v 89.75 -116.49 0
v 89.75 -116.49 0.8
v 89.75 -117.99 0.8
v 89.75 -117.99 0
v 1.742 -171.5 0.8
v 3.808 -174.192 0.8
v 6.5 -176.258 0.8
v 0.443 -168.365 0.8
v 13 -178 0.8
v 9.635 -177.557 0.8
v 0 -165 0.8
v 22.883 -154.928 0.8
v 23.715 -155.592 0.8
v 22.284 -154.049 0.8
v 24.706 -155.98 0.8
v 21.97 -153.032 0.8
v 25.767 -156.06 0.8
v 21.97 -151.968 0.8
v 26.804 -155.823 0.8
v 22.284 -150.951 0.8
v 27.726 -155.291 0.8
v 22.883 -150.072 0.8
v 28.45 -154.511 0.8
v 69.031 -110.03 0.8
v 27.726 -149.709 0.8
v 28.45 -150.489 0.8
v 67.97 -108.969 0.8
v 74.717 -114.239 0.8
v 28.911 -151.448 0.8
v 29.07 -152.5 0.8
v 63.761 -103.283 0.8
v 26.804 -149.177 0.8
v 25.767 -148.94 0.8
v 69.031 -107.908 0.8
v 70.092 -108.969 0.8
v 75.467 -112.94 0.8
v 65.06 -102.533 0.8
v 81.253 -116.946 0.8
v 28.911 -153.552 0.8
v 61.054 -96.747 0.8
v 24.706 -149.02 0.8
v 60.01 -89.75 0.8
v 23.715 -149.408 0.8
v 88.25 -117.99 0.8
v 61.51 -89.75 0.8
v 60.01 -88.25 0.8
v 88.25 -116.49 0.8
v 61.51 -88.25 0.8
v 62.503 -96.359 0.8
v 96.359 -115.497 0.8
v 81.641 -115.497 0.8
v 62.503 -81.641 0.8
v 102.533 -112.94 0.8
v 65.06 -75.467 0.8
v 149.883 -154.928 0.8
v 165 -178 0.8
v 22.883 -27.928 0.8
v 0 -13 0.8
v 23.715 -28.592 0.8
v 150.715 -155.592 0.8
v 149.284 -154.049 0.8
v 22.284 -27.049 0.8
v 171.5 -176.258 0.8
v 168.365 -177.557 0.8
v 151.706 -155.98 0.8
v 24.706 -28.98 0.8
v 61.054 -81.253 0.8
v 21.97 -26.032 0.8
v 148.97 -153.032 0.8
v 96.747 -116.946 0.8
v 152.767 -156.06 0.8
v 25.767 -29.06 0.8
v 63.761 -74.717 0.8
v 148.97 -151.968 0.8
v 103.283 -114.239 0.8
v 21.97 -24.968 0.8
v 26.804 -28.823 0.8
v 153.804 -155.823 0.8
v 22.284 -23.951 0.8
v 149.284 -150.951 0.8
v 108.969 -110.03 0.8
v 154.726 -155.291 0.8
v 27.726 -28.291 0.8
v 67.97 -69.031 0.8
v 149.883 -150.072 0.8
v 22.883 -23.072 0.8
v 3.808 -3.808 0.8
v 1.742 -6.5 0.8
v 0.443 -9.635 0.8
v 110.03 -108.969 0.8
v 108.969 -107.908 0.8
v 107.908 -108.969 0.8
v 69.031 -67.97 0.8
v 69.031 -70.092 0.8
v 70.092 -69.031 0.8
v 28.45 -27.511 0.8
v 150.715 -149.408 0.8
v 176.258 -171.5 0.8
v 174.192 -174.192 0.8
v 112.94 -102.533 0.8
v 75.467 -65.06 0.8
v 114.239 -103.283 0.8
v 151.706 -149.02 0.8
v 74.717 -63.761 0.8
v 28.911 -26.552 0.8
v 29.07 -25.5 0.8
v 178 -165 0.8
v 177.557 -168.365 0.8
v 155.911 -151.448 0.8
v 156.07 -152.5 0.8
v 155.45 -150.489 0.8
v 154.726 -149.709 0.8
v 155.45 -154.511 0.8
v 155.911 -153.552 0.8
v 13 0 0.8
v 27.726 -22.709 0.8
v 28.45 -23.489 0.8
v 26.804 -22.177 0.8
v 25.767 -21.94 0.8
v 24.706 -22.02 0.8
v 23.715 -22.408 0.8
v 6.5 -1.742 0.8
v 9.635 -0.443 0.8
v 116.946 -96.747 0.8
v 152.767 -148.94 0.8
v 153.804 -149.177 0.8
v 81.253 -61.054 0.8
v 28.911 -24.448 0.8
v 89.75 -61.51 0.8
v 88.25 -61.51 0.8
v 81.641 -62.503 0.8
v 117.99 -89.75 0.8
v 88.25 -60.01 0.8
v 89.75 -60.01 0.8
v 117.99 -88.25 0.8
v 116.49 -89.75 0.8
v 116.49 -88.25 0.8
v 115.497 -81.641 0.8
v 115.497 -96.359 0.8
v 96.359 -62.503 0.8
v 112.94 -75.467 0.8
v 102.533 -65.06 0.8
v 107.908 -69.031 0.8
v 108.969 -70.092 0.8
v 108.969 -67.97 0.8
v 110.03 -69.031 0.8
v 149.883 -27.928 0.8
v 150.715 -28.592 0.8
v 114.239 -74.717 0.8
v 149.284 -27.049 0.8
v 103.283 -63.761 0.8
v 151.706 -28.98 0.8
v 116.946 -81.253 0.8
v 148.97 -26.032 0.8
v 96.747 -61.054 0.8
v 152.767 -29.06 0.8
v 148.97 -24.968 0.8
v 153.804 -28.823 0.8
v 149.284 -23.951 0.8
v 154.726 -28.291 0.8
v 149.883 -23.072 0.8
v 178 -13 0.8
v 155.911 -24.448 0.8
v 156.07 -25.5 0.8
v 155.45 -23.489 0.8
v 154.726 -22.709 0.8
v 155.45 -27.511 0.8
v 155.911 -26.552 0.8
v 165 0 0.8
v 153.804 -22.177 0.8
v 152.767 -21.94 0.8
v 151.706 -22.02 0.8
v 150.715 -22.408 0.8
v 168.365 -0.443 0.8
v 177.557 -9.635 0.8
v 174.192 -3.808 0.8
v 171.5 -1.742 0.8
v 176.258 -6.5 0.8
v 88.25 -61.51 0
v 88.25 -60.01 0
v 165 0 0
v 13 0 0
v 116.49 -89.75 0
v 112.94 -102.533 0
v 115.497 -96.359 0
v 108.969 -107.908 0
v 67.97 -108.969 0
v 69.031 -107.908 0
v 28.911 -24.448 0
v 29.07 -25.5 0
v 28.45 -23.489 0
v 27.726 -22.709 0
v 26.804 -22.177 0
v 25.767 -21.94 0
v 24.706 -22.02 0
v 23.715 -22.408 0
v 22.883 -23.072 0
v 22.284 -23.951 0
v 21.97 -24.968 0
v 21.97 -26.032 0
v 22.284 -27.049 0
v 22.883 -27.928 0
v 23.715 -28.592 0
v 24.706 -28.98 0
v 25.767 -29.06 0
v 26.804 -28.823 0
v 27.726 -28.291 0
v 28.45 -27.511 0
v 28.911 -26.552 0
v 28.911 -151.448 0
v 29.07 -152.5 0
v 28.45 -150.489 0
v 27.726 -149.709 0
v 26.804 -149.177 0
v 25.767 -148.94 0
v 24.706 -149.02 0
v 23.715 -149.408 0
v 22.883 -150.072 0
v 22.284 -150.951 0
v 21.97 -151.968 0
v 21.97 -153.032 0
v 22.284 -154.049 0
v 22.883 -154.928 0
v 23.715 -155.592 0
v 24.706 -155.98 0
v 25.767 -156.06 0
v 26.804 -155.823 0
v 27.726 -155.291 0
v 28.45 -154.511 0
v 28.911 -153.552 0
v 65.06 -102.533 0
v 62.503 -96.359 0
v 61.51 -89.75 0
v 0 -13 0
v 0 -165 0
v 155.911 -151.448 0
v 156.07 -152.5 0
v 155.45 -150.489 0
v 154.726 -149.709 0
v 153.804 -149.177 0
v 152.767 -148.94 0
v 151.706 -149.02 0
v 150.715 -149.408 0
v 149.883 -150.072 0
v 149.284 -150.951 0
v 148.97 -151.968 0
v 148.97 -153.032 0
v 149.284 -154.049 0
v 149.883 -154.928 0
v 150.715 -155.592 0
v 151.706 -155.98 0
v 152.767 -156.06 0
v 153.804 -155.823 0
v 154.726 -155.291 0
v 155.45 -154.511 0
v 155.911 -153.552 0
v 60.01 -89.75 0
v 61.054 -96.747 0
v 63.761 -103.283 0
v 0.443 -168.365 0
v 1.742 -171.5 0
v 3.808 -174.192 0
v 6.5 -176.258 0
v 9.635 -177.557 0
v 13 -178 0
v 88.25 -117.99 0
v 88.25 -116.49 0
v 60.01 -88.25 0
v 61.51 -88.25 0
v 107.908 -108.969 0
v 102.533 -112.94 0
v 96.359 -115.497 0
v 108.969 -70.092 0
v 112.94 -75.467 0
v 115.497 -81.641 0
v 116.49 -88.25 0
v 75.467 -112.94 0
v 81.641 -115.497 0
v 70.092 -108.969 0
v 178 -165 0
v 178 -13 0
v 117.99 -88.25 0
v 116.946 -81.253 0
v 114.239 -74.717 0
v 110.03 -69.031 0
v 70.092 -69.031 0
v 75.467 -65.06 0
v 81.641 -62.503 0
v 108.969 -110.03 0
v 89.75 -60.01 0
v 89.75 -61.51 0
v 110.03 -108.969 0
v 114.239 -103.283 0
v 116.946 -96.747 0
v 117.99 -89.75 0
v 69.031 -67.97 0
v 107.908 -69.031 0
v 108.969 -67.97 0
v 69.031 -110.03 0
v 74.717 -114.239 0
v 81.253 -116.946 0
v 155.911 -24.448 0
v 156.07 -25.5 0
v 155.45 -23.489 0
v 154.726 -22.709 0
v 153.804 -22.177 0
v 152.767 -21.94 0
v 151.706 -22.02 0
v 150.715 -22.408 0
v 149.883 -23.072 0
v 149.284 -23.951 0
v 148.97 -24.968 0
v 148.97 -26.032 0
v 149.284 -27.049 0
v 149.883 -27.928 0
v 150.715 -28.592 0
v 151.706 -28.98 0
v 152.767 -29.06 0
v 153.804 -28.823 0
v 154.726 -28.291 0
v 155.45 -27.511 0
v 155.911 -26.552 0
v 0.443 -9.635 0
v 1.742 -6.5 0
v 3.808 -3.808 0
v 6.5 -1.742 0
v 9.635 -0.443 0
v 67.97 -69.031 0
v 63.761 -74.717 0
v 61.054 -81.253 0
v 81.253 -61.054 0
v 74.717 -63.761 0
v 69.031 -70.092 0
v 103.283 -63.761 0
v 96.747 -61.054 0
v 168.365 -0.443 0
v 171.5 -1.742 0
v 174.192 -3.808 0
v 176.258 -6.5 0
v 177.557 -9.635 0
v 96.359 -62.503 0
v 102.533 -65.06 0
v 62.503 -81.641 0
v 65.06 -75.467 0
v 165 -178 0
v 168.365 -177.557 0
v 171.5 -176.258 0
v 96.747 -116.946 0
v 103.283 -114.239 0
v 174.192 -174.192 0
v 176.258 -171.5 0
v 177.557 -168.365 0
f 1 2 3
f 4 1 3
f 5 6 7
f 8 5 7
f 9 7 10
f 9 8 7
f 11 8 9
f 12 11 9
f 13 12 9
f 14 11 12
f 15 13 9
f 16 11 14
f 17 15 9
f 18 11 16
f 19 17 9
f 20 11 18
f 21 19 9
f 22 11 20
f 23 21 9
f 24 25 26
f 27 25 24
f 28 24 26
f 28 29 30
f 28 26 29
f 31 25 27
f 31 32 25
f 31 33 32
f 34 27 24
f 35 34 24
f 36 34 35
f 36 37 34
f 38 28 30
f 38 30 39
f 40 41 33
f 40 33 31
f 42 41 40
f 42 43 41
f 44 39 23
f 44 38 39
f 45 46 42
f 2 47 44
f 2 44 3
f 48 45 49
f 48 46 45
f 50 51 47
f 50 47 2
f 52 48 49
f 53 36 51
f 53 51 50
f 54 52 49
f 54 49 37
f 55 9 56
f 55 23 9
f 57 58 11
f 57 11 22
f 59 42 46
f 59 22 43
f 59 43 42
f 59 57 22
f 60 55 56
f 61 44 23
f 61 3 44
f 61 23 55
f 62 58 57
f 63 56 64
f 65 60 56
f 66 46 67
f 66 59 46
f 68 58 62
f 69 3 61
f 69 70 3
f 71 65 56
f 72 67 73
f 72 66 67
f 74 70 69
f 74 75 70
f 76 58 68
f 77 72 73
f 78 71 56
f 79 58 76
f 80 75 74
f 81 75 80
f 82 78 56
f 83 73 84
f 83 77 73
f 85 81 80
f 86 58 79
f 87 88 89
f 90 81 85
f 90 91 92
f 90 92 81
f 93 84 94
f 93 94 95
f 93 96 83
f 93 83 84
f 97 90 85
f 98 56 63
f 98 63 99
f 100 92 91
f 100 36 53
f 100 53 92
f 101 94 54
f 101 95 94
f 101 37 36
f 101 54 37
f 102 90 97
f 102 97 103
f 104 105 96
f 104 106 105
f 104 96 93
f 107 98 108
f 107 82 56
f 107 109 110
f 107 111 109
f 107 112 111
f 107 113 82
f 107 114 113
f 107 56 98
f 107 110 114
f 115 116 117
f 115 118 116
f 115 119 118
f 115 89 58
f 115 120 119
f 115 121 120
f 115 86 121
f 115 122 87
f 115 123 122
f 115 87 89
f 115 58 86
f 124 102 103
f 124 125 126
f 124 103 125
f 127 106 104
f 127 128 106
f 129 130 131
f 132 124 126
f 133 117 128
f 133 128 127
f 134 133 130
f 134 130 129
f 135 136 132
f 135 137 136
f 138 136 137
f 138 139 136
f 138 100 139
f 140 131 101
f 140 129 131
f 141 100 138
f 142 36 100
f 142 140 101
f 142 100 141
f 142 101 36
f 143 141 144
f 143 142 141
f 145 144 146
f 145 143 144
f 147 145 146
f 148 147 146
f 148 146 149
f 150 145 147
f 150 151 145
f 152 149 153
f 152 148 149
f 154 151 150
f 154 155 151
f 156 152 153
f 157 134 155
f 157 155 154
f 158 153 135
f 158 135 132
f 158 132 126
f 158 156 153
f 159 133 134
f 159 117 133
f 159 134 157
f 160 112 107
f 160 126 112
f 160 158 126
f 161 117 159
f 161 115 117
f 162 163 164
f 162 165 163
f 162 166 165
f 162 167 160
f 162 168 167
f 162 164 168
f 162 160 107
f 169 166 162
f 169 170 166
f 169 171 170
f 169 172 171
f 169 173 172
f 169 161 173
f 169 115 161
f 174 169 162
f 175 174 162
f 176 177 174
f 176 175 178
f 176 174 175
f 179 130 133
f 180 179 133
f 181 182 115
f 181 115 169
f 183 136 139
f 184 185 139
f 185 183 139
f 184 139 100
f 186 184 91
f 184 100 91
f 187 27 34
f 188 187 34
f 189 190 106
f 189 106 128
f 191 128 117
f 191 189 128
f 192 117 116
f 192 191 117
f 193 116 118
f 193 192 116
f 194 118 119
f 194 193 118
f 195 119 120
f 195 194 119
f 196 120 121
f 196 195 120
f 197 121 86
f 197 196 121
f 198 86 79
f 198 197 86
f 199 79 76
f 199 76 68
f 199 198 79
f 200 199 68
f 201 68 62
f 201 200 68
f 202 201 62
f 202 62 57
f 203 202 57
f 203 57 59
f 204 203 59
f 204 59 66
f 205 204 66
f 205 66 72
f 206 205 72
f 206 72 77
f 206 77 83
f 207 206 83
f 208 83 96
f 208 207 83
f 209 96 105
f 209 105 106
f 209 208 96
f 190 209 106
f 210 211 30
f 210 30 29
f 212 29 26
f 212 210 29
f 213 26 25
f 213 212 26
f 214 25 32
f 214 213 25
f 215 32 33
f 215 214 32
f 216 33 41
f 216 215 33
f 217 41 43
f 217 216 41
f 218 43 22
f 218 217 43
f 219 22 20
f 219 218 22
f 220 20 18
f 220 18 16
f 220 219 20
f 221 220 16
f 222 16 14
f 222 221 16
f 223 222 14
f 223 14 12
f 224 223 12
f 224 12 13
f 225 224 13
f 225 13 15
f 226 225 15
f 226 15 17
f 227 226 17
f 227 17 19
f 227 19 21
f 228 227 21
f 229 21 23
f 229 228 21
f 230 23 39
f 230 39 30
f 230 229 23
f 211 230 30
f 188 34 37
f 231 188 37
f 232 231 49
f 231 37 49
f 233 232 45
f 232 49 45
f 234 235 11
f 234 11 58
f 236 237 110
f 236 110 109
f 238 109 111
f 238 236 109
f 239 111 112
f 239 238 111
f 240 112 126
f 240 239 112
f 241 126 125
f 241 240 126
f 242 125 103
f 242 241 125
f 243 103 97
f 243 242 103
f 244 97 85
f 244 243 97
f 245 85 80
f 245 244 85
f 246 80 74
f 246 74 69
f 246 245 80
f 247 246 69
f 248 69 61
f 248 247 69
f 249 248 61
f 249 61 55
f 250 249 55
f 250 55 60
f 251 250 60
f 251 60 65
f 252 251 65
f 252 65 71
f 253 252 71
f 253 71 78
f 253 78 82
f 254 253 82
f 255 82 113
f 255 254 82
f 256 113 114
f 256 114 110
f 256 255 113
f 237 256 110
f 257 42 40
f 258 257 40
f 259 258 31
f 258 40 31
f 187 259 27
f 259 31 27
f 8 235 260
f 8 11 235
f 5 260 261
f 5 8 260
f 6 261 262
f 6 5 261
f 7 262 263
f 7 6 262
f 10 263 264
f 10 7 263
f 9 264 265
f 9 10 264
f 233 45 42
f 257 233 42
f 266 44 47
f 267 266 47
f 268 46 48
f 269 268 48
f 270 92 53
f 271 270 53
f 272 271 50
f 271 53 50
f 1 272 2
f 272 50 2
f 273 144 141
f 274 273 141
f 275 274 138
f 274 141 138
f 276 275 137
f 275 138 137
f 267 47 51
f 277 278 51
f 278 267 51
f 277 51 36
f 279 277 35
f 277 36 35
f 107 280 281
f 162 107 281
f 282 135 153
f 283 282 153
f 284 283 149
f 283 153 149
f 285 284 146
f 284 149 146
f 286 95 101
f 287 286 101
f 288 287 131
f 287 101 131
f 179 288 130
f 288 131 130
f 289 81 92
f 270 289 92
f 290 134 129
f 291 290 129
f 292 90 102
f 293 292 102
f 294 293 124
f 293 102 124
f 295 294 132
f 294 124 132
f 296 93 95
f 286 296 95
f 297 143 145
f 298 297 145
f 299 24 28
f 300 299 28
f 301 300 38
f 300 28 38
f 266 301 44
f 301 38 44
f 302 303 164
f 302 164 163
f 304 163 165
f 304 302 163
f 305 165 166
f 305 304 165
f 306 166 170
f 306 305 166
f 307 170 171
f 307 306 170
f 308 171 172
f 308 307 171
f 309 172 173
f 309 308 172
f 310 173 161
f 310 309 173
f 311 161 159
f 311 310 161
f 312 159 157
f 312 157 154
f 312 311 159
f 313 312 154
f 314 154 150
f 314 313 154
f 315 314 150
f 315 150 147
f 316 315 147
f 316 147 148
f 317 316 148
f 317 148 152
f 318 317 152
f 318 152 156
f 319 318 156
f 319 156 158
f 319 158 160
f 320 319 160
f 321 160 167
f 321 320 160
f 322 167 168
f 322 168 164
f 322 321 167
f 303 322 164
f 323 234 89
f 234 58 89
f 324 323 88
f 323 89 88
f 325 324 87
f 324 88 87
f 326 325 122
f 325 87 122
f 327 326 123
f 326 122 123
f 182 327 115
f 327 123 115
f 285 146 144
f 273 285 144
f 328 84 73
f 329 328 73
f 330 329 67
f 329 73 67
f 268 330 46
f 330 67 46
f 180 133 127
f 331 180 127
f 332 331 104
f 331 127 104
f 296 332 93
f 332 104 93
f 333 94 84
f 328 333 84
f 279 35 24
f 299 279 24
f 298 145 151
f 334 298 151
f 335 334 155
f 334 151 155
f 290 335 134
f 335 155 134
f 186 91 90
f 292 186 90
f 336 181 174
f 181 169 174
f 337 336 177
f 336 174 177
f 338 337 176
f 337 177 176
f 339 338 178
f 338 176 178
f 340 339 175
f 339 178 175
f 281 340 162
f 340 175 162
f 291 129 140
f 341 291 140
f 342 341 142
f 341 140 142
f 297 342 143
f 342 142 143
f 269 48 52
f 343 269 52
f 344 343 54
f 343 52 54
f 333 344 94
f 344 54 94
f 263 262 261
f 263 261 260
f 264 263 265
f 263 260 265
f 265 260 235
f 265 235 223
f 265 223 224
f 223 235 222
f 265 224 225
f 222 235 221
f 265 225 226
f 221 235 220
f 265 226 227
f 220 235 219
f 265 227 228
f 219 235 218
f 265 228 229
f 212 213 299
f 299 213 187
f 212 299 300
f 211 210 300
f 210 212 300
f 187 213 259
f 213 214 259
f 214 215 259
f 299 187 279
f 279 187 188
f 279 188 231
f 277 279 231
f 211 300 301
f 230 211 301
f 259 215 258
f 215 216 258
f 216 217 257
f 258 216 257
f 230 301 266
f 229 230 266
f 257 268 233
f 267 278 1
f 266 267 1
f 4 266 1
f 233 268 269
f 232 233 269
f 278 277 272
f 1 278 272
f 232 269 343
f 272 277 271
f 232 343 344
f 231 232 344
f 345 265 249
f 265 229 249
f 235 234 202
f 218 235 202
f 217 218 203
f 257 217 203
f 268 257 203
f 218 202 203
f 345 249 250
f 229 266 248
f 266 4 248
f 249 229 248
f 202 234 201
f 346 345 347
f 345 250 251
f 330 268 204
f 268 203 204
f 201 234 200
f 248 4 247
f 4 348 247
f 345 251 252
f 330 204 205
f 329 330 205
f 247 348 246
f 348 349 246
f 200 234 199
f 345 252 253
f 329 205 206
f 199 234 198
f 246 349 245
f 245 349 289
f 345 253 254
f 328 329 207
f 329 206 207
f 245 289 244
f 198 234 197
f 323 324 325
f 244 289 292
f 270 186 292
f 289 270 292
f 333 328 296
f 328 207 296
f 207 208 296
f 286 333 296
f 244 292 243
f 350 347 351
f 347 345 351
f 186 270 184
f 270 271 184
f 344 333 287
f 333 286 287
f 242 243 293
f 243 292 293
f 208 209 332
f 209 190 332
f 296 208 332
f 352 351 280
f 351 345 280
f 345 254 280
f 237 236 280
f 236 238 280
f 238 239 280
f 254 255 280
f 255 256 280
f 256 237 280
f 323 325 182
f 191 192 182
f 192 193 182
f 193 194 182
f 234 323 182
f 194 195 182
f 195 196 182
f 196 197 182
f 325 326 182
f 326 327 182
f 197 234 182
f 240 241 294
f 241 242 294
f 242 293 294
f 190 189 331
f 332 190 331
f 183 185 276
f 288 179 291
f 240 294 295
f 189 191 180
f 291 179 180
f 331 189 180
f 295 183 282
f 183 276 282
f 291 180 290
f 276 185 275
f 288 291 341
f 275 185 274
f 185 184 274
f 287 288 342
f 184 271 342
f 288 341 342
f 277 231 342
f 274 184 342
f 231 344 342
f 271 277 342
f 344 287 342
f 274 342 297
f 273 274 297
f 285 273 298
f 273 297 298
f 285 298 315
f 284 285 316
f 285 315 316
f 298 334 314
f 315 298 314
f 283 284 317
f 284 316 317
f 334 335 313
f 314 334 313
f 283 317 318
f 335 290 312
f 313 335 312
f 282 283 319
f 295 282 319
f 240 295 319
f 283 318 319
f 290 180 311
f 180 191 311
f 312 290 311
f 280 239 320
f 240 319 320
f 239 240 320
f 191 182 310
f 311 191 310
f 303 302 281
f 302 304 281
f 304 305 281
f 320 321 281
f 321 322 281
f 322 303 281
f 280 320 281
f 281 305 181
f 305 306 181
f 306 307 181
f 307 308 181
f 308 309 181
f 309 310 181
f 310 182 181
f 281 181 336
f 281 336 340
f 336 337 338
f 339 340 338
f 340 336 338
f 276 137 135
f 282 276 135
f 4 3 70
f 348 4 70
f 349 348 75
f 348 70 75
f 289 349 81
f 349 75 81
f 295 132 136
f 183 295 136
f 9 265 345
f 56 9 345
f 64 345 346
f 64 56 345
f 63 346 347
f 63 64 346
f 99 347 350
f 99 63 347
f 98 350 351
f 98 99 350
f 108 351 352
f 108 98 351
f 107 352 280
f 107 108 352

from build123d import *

# Parameters (mm, degrees)
SKETCH1_W           = 178
SKETCH1_H           = 178
SKETCH1_R           = 3.57
BOSS_EXTRUDE1_DEPTH = 0.8
FILLET1_R           = 13
CUT_EXTRUDE1_DEPTH  = 10


with BuildPart() as part:
    # Sketch1 → Boss-Extrude1 (new body)
    with BuildSketch(Plane.XY):
        with Locations((89, -89)):
            Rectangle(SKETCH1_W, SKETCH1_H)
        with Locations((25.5, -25.5)):
            Circle(SKETCH1_R, mode=Mode.SUBTRACT)
        with Locations((152.5, -25.5)):
            Circle(SKETCH1_R, mode=Mode.SUBTRACT)
        with Locations((152.5, -152.5)):
            Circle(SKETCH1_R, mode=Mode.SUBTRACT)
        with Locations((25.5, -152.5)):
            Circle(SKETCH1_R, mode=Mode.SUBTRACT)
    extrude(amount=BOSS_EXTRUDE1_DEPTH)

    # Fillet1
    fillet1_edges = [part.edges().sort_by_distance(p)[0] for p in [
        (0, 0, 0.4),
        (178, 0, 0.4),
        (178, -178, 0.4),
        (0, -178, 0.4),
    ]]
    fillet(fillet1_edges, radius=FILLET1_R)

    # Sketch2 → Cut-Extrude1 (cut)
    with BuildSketch(Plane.XY.offset(0.8)):
        with BuildLine():
            Line((88.25, -61.510229175), (88.25, -60.009699898))
            ThreePointArc((88.25, -60.009699898), (77.902180461, -62.207493557), (69.031092295, -67.970432123))
            Line((69.031092295, -67.970432123), (70.092126722, -69.031466551))
            ThreePointArc((70.092126722, -69.031466551), (78.47620561, -63.593312856), (88.25, -61.510229175))
        make_face()
        with BuildLine():
            ThreePointArc((108.968907705, -67.970432123), (100.097819539, -62.207493557), (89.75, -60.009699898))
            Line((89.75, -60.009699898), (89.75, -61.510229175))
            ThreePointArc((89.75, -61.510229175), (99.52379439, -63.593312856), (107.907873278, -69.031466551))
            Line((107.907873278, -69.031466551), (108.968907705, -67.970432123))
        make_face()
        with BuildLine():
            ThreePointArc((117.990300102, -88.25), (115.792506443, -77.902180461), (110.029567877, -69.031092295))
            Line((110.029567877, -69.031092295), (108.968533449, -70.092126722))
            ThreePointArc((108.968533449, -70.092126722), (114.406687144, -78.47620561), (116.489770825, -88.25))
            Line((116.489770825, -88.25), (117.990300102, -88.25))
        make_face()
        with BuildLine():
            ThreePointArc((89.75, -117.990300102), (100.097819539, -115.792506443), (108.968907705, -110.029567877))
            Line((108.968907705, -110.029567877), (107.907873278, -108.968533449))
            ThreePointArc((107.907873278, -108.968533449), (99.52379439, -114.406687144), (89.75, -116.489770825))
            Line((89.75, -116.489770825), (89.75, -117.990300102))
        make_face()
        with BuildLine():
            ThreePointArc((110.029567877, -108.968907705), (115.792506443, -100.097819539), (117.990300102, -89.75))
            Line((117.990300102, -89.75), (116.489770825, -89.75))
            ThreePointArc((116.489770825, -89.75), (114.406687144, -99.52379439), (108.968533449, -107.907873278))
            Line((108.968533449, -107.907873278), (110.029567877, -108.968907705))
        make_face()
        with BuildLine():
            Line((69.031466551, -70.092126722), (67.970432123, -69.031092295))
            ThreePointArc((67.970432123, -69.031092295), (62.207493557, -77.902180461), (60.009699898, -88.25))
            Line((60.009699898, -88.25), (61.510229175, -88.25))
            ThreePointArc((61.510229175, -88.25), (63.593312856, -78.47620561), (69.031466551, -70.092126722))
        make_face()
        with BuildLine():
            Line((61.510229175, -89.75), (60.009699898, -89.75))
            ThreePointArc((60.009699898, -89.75), (62.207493557, -100.097819539), (67.970432123, -108.968907705))
            Line((67.970432123, -108.968907705), (69.031466551, -107.907873278))
            ThreePointArc((69.031466551, -107.907873278), (63.593312856, -99.52379439), (61.510229175, -89.75))
        make_face()
        with BuildLine():
            Line((70.092126722, -108.968533449), (69.031092295, -110.029567877))
            ThreePointArc((69.031092295, -110.029567877), (77.902180461, -115.792506443), (88.25, -117.990300102))
            Line((88.25, -117.990300102), (88.25, -116.489770825))
            ThreePointArc((88.25, -116.489770825), (78.47620561, -114.406687144), (70.092126722, -108.968533449))
        make_face()
    extrude(amount=-CUT_EXTRUDE1_DEPTH, mode=Mode.SUBTRACT)


solid = part.part
